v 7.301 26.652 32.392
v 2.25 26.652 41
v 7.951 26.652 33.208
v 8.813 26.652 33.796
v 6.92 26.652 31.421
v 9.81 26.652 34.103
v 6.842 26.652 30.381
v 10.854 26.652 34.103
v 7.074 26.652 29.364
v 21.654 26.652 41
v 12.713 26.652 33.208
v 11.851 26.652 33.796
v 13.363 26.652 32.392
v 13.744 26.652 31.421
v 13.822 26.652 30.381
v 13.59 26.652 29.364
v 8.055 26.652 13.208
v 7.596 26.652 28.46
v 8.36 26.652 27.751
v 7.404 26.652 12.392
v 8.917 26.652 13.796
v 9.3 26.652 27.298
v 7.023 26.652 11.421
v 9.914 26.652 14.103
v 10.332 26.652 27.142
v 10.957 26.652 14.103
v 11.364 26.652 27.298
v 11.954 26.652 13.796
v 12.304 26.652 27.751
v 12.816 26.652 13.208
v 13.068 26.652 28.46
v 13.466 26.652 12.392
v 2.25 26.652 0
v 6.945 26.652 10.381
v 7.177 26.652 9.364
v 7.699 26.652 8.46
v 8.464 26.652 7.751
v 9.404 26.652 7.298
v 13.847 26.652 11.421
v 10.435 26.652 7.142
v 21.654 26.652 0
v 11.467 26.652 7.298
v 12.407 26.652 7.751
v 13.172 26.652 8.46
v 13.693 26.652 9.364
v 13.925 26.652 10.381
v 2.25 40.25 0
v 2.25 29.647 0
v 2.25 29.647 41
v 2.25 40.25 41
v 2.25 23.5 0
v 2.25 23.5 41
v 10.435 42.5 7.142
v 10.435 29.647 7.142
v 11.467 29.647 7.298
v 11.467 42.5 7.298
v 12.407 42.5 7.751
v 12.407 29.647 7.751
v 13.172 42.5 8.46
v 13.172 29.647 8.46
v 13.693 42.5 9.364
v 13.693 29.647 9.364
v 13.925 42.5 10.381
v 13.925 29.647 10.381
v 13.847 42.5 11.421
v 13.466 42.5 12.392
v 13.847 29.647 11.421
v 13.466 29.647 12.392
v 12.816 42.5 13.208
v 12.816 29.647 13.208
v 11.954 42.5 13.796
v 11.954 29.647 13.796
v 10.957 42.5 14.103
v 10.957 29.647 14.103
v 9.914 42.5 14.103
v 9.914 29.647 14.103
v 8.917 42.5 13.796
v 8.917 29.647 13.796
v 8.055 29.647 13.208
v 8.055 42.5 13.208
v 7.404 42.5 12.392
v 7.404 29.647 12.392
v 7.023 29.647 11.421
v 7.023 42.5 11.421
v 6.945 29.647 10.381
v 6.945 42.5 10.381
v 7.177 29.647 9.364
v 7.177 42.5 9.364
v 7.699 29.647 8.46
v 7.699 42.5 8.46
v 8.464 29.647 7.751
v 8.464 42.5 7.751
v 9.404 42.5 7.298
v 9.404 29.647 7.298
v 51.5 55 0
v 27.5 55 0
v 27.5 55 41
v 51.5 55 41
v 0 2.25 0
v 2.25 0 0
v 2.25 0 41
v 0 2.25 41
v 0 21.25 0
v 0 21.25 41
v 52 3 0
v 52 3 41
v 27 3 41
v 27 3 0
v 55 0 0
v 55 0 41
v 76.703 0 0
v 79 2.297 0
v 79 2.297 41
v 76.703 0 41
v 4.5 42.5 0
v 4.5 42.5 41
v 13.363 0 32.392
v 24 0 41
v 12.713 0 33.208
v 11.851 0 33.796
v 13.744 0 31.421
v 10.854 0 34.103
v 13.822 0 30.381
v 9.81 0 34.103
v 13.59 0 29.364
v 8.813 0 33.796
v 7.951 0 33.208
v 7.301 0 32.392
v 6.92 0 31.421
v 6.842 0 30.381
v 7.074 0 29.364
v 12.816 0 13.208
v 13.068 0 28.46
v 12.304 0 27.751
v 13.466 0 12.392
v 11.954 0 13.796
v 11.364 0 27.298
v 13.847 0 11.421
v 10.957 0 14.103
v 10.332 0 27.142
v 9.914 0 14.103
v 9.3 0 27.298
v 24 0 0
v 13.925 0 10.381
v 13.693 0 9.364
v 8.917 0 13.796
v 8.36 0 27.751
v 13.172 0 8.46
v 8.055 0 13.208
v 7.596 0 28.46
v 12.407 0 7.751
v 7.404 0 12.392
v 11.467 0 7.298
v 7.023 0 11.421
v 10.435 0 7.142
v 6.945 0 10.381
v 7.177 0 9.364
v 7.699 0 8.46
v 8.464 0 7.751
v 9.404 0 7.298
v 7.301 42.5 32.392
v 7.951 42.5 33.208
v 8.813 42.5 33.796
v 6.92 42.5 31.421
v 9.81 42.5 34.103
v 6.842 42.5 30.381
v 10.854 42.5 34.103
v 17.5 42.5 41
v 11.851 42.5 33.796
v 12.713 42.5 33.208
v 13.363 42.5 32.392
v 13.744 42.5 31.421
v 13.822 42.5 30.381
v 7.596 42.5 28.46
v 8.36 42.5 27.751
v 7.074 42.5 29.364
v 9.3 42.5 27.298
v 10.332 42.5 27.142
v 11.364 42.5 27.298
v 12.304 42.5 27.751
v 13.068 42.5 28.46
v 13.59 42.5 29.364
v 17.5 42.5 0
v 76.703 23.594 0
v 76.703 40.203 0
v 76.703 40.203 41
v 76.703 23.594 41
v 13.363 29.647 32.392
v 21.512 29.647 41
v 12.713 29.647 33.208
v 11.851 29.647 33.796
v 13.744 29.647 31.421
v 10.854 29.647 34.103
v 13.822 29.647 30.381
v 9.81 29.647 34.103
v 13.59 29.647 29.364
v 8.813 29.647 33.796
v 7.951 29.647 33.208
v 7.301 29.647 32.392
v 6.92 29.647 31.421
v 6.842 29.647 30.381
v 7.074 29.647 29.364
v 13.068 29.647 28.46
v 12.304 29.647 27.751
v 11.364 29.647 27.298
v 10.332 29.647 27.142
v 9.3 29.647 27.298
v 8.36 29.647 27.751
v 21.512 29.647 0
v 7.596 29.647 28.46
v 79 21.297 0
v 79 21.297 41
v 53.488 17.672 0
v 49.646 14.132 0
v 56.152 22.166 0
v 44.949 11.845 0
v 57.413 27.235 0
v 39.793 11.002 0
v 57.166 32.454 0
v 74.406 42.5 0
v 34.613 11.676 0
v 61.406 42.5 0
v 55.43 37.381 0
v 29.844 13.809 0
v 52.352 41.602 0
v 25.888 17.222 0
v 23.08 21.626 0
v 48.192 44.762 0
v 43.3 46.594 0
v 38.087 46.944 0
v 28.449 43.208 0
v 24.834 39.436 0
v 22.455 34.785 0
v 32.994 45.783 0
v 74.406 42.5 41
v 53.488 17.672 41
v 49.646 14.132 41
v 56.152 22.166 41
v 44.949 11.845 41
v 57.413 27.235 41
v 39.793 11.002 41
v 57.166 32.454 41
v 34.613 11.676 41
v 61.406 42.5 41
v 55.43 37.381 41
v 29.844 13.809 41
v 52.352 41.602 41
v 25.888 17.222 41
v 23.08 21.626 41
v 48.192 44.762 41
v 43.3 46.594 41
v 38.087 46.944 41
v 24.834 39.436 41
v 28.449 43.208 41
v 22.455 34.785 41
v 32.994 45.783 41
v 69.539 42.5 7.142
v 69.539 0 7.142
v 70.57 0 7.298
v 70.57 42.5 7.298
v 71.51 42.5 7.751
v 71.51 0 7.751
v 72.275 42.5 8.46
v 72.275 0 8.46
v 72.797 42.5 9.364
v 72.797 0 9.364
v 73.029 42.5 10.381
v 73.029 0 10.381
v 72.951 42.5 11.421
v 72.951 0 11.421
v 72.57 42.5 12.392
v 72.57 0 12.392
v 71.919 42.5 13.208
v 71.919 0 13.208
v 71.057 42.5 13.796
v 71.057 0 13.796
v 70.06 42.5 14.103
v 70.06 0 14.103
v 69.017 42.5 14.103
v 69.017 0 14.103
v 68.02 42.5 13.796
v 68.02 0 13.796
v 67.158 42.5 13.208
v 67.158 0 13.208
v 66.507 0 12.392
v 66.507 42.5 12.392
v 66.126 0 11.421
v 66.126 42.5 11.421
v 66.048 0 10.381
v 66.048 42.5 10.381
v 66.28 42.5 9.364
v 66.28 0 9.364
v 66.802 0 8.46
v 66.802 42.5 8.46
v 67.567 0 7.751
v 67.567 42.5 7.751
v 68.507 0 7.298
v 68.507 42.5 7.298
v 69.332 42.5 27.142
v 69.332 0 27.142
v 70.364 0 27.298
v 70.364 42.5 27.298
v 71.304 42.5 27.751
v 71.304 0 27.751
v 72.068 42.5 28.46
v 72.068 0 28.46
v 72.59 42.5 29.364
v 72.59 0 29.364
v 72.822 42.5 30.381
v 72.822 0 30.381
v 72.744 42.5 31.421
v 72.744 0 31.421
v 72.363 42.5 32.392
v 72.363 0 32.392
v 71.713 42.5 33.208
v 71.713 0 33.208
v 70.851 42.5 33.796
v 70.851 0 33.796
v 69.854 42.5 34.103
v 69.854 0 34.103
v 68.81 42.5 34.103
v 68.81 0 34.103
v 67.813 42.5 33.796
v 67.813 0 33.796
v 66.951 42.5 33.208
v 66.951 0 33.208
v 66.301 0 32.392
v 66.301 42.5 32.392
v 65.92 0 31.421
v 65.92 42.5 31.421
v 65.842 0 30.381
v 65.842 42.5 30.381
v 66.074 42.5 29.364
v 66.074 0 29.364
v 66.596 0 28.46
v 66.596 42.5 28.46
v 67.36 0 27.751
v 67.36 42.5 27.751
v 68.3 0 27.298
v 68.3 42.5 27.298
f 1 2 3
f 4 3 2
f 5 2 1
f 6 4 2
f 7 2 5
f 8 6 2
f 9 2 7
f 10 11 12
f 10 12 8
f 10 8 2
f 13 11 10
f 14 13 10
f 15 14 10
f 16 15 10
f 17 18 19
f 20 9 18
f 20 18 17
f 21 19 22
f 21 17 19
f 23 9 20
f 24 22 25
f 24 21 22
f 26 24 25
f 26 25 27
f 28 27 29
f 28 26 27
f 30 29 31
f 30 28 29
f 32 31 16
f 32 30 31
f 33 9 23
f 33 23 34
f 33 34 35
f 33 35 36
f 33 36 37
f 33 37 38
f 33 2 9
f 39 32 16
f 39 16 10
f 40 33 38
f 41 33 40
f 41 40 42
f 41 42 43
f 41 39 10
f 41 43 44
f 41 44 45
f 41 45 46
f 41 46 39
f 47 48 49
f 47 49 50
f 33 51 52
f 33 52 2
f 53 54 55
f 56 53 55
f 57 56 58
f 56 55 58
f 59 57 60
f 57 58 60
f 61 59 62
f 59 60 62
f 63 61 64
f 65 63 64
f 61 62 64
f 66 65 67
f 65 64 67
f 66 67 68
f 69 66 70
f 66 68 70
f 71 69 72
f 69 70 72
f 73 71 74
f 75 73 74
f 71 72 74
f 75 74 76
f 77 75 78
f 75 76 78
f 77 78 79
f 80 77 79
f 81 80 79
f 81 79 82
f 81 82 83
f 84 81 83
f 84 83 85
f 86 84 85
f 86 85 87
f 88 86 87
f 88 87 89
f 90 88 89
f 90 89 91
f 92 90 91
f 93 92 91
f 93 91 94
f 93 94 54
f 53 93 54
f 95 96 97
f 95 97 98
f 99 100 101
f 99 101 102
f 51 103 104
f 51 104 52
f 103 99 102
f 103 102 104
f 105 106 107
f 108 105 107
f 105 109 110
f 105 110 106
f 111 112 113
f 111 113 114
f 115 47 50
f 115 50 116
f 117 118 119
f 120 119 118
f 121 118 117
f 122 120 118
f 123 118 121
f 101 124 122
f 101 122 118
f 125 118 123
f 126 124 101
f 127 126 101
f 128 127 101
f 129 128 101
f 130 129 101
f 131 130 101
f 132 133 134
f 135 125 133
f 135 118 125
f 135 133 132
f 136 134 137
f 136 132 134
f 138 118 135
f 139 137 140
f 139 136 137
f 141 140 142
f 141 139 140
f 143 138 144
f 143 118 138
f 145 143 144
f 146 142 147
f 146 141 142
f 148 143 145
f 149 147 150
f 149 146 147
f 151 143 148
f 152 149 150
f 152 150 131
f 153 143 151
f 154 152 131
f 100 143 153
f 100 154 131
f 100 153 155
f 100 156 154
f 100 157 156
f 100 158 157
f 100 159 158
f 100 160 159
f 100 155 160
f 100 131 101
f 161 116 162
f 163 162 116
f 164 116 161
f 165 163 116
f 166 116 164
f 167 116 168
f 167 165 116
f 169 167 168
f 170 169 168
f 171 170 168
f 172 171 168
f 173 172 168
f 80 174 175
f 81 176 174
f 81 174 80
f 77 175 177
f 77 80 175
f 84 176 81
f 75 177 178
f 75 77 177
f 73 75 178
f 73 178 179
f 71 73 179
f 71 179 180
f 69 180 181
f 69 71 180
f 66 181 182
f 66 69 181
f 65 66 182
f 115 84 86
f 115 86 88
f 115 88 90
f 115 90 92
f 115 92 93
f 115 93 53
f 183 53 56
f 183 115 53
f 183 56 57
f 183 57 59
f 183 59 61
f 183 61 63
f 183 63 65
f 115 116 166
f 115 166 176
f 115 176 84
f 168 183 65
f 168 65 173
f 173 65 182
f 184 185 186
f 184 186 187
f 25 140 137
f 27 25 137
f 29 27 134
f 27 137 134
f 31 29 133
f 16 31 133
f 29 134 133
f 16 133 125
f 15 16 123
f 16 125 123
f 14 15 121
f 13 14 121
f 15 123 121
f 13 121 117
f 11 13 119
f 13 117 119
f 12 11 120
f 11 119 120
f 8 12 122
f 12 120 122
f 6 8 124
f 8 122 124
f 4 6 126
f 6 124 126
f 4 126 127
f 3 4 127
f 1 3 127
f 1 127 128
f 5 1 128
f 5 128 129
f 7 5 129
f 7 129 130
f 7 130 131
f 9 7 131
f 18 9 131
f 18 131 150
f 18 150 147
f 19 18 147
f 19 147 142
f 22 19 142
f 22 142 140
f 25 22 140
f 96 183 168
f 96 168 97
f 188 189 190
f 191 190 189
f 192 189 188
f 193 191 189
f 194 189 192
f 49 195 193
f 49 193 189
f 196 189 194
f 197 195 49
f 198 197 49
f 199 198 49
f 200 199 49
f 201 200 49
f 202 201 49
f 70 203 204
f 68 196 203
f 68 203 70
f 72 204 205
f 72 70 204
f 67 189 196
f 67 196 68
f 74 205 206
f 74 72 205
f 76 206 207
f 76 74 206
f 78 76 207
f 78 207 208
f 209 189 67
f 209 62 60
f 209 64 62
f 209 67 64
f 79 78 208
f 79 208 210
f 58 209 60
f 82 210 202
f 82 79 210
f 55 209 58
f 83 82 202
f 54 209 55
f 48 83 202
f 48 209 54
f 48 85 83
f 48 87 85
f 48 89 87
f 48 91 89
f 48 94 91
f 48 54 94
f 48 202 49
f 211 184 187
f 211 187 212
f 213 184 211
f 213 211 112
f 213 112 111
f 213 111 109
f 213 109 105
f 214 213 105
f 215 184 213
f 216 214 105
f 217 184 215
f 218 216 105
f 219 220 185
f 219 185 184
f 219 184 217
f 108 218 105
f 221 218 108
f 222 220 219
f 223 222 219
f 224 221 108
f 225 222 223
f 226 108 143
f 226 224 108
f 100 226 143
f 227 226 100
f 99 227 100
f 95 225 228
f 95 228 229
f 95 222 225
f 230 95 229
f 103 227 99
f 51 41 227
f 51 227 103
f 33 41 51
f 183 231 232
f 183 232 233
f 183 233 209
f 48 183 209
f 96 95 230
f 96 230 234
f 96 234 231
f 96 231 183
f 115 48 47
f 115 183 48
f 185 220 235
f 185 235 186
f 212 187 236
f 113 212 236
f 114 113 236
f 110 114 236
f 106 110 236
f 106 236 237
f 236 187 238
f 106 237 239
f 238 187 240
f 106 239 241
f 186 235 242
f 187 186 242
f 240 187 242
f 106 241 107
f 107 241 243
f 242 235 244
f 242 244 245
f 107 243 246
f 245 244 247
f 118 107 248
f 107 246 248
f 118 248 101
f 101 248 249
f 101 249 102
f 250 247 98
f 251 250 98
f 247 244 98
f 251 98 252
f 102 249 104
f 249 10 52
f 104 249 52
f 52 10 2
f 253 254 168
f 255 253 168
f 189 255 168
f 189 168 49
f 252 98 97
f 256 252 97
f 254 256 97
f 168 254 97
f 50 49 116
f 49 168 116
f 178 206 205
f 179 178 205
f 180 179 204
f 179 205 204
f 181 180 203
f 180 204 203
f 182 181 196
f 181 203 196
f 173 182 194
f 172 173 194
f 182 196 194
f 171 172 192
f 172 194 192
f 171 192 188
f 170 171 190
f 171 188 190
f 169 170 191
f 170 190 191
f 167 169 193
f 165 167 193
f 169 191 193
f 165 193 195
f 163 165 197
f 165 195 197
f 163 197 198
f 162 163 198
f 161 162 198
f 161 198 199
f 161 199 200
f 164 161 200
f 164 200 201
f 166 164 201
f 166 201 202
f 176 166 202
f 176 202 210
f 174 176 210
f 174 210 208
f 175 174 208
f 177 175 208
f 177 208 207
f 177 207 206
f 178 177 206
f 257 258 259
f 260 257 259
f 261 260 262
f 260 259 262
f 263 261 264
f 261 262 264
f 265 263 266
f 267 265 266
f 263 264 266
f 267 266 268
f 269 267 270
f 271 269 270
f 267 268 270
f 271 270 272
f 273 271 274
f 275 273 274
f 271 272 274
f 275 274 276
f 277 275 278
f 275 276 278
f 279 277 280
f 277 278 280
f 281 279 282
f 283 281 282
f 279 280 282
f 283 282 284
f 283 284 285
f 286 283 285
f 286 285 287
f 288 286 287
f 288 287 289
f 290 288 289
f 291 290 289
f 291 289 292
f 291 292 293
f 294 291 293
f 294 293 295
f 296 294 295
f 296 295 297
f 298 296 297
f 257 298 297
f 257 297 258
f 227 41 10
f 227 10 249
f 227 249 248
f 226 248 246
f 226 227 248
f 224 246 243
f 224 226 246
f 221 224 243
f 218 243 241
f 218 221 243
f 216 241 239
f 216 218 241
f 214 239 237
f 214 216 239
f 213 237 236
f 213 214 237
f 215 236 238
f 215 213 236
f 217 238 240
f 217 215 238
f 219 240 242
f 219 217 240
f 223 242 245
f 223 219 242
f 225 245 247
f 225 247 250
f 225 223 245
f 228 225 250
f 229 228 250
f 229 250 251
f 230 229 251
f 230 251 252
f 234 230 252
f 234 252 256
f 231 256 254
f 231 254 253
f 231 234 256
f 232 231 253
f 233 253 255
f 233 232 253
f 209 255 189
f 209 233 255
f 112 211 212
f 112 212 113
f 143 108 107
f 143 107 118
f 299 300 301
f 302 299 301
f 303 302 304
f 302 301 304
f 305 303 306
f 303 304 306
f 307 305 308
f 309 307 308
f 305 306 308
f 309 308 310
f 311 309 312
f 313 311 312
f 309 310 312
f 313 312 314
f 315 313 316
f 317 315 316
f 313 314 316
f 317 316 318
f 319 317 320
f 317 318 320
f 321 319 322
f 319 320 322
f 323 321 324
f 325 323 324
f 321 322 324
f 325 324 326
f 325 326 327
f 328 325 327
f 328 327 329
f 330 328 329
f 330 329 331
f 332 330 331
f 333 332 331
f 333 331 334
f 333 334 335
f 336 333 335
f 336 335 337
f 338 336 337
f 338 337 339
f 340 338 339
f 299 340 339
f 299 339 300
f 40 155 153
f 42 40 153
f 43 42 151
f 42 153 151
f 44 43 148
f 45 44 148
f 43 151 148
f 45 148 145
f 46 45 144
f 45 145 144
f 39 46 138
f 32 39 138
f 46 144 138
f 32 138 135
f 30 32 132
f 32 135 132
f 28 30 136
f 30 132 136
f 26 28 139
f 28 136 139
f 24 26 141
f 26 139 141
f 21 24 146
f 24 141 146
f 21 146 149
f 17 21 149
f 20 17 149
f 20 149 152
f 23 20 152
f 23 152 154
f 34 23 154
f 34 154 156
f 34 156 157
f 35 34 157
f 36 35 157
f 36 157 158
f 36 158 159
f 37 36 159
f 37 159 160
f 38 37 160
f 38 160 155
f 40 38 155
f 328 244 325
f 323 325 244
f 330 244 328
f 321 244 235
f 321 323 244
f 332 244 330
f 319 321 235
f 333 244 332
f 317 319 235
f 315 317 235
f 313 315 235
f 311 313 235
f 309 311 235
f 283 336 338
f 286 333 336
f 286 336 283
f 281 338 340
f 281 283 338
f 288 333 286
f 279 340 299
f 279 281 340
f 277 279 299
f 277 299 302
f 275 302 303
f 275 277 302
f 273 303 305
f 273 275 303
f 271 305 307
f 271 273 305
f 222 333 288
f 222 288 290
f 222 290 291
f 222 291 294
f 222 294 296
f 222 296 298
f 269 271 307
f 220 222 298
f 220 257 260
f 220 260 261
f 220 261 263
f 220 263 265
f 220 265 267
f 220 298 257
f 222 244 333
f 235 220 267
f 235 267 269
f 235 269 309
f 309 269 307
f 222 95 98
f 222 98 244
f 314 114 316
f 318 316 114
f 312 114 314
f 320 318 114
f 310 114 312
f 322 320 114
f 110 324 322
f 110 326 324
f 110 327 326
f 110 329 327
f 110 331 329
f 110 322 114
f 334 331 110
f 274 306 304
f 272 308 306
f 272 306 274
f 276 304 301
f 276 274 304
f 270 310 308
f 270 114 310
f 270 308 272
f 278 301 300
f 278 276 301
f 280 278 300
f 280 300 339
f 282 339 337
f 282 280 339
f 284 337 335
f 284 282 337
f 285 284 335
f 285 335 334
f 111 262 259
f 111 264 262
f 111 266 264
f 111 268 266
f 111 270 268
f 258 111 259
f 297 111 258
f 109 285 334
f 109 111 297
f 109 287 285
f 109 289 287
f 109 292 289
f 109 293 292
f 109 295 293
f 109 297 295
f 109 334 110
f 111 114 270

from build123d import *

# Parameters (mm, degrees)
EXTRUDE_5_DEPTH     = 41
SKETCH_2_R          = 3.5
CUT_EXTRUDE_3_DEPTH = 50


with BuildPart() as part:
    # 草图1 → 凸台-拉伸5 (new body)
    with BuildSketch(Plane.XY):
        with BuildLine():
            ThreePointArc((21.653756169, 26.652324316), (57.479756353, 29.853440976), (21.511621785, 29.646721888))
            Line((21.511621785, 29.646721888), (2.250174694, 29.646721888))
            Line((2.250174694, 29.646721888), (2.250174694, 40.249825306))
            Line((2.250174694, 40.249825306), (4.500349388, 42.5))
            Line((4.500349388, 42.5), (17.500349388, 42.5))
            Line((17.500349388, 42.5), (27.5, 55))
            Line((27.5, 55), (51.5, 55))
            Line((51.5, 55), (61.4058809, 42.5))
            Line((61.4058809, 42.5), (74.4058809, 42.5))
            Line((74.4058809, 42.5), (76.70294045, 40.20294045))
            Line((76.70294045, 40.20294045), (76.70294045, 23.5941191))
            Line((76.70294045, 23.5941191), (79, 21.29705955))
            Line((79, 21.29705955), (79, 2.29705955))
            Line((79, 2.29705955), (76.70294045, 0))
            Line((76.70294045, 0), (55, 0))
            Line((55, 0), (52, 3))
            Line((52, 3), (27, 3))
            Line((27, 3), (24, 0))
            Line((24, 0), (2.250174694, 0))
            Line((2.250174694, 0), (0, 2.250174694))
            Line((0, 2.250174694), (0, 21.250174694))
            Line((0, 21.250174694), (2.250174694, 23.500349388))
            Line((2.250174694, 23.500349388), (2.250174694, 26.652324316))
            Line((2.250174694, 26.652324316), (21.653756169, 26.652324316))
        make_face()
    extrude(amount=EXTRUDE_5_DEPTH)

    # 草图2 → 切除-拉伸3 (cut)
    with BuildSketch(Plane(origin=(0, 0, 0), x_dir=(-1, 0, 0), z_dir=(0, -1, 0))):
        with Locations(Location((-10.435250124, -10.64238292, 0), (0, 0, 90))):
            Circle(SKETCH_2_R)
        with Locations(Location((-10.331990941, -30.64238292, 0), (0, 0, 90))):
            Circle(SKETCH_2_R)
        with Locations(Location((-69.331990941, -30.64238292, 0), (0, 0, 90))):
            Circle(SKETCH_2_R)
        with Locations(Location((-69.538509307, -10.64238292, 0), (0, 0, 90))):
            Circle(SKETCH_2_R)
    extrude(amount=-CUT_EXTRUDE_3_DEPTH, mode=Mode.SUBTRACT)


solid = part.part
